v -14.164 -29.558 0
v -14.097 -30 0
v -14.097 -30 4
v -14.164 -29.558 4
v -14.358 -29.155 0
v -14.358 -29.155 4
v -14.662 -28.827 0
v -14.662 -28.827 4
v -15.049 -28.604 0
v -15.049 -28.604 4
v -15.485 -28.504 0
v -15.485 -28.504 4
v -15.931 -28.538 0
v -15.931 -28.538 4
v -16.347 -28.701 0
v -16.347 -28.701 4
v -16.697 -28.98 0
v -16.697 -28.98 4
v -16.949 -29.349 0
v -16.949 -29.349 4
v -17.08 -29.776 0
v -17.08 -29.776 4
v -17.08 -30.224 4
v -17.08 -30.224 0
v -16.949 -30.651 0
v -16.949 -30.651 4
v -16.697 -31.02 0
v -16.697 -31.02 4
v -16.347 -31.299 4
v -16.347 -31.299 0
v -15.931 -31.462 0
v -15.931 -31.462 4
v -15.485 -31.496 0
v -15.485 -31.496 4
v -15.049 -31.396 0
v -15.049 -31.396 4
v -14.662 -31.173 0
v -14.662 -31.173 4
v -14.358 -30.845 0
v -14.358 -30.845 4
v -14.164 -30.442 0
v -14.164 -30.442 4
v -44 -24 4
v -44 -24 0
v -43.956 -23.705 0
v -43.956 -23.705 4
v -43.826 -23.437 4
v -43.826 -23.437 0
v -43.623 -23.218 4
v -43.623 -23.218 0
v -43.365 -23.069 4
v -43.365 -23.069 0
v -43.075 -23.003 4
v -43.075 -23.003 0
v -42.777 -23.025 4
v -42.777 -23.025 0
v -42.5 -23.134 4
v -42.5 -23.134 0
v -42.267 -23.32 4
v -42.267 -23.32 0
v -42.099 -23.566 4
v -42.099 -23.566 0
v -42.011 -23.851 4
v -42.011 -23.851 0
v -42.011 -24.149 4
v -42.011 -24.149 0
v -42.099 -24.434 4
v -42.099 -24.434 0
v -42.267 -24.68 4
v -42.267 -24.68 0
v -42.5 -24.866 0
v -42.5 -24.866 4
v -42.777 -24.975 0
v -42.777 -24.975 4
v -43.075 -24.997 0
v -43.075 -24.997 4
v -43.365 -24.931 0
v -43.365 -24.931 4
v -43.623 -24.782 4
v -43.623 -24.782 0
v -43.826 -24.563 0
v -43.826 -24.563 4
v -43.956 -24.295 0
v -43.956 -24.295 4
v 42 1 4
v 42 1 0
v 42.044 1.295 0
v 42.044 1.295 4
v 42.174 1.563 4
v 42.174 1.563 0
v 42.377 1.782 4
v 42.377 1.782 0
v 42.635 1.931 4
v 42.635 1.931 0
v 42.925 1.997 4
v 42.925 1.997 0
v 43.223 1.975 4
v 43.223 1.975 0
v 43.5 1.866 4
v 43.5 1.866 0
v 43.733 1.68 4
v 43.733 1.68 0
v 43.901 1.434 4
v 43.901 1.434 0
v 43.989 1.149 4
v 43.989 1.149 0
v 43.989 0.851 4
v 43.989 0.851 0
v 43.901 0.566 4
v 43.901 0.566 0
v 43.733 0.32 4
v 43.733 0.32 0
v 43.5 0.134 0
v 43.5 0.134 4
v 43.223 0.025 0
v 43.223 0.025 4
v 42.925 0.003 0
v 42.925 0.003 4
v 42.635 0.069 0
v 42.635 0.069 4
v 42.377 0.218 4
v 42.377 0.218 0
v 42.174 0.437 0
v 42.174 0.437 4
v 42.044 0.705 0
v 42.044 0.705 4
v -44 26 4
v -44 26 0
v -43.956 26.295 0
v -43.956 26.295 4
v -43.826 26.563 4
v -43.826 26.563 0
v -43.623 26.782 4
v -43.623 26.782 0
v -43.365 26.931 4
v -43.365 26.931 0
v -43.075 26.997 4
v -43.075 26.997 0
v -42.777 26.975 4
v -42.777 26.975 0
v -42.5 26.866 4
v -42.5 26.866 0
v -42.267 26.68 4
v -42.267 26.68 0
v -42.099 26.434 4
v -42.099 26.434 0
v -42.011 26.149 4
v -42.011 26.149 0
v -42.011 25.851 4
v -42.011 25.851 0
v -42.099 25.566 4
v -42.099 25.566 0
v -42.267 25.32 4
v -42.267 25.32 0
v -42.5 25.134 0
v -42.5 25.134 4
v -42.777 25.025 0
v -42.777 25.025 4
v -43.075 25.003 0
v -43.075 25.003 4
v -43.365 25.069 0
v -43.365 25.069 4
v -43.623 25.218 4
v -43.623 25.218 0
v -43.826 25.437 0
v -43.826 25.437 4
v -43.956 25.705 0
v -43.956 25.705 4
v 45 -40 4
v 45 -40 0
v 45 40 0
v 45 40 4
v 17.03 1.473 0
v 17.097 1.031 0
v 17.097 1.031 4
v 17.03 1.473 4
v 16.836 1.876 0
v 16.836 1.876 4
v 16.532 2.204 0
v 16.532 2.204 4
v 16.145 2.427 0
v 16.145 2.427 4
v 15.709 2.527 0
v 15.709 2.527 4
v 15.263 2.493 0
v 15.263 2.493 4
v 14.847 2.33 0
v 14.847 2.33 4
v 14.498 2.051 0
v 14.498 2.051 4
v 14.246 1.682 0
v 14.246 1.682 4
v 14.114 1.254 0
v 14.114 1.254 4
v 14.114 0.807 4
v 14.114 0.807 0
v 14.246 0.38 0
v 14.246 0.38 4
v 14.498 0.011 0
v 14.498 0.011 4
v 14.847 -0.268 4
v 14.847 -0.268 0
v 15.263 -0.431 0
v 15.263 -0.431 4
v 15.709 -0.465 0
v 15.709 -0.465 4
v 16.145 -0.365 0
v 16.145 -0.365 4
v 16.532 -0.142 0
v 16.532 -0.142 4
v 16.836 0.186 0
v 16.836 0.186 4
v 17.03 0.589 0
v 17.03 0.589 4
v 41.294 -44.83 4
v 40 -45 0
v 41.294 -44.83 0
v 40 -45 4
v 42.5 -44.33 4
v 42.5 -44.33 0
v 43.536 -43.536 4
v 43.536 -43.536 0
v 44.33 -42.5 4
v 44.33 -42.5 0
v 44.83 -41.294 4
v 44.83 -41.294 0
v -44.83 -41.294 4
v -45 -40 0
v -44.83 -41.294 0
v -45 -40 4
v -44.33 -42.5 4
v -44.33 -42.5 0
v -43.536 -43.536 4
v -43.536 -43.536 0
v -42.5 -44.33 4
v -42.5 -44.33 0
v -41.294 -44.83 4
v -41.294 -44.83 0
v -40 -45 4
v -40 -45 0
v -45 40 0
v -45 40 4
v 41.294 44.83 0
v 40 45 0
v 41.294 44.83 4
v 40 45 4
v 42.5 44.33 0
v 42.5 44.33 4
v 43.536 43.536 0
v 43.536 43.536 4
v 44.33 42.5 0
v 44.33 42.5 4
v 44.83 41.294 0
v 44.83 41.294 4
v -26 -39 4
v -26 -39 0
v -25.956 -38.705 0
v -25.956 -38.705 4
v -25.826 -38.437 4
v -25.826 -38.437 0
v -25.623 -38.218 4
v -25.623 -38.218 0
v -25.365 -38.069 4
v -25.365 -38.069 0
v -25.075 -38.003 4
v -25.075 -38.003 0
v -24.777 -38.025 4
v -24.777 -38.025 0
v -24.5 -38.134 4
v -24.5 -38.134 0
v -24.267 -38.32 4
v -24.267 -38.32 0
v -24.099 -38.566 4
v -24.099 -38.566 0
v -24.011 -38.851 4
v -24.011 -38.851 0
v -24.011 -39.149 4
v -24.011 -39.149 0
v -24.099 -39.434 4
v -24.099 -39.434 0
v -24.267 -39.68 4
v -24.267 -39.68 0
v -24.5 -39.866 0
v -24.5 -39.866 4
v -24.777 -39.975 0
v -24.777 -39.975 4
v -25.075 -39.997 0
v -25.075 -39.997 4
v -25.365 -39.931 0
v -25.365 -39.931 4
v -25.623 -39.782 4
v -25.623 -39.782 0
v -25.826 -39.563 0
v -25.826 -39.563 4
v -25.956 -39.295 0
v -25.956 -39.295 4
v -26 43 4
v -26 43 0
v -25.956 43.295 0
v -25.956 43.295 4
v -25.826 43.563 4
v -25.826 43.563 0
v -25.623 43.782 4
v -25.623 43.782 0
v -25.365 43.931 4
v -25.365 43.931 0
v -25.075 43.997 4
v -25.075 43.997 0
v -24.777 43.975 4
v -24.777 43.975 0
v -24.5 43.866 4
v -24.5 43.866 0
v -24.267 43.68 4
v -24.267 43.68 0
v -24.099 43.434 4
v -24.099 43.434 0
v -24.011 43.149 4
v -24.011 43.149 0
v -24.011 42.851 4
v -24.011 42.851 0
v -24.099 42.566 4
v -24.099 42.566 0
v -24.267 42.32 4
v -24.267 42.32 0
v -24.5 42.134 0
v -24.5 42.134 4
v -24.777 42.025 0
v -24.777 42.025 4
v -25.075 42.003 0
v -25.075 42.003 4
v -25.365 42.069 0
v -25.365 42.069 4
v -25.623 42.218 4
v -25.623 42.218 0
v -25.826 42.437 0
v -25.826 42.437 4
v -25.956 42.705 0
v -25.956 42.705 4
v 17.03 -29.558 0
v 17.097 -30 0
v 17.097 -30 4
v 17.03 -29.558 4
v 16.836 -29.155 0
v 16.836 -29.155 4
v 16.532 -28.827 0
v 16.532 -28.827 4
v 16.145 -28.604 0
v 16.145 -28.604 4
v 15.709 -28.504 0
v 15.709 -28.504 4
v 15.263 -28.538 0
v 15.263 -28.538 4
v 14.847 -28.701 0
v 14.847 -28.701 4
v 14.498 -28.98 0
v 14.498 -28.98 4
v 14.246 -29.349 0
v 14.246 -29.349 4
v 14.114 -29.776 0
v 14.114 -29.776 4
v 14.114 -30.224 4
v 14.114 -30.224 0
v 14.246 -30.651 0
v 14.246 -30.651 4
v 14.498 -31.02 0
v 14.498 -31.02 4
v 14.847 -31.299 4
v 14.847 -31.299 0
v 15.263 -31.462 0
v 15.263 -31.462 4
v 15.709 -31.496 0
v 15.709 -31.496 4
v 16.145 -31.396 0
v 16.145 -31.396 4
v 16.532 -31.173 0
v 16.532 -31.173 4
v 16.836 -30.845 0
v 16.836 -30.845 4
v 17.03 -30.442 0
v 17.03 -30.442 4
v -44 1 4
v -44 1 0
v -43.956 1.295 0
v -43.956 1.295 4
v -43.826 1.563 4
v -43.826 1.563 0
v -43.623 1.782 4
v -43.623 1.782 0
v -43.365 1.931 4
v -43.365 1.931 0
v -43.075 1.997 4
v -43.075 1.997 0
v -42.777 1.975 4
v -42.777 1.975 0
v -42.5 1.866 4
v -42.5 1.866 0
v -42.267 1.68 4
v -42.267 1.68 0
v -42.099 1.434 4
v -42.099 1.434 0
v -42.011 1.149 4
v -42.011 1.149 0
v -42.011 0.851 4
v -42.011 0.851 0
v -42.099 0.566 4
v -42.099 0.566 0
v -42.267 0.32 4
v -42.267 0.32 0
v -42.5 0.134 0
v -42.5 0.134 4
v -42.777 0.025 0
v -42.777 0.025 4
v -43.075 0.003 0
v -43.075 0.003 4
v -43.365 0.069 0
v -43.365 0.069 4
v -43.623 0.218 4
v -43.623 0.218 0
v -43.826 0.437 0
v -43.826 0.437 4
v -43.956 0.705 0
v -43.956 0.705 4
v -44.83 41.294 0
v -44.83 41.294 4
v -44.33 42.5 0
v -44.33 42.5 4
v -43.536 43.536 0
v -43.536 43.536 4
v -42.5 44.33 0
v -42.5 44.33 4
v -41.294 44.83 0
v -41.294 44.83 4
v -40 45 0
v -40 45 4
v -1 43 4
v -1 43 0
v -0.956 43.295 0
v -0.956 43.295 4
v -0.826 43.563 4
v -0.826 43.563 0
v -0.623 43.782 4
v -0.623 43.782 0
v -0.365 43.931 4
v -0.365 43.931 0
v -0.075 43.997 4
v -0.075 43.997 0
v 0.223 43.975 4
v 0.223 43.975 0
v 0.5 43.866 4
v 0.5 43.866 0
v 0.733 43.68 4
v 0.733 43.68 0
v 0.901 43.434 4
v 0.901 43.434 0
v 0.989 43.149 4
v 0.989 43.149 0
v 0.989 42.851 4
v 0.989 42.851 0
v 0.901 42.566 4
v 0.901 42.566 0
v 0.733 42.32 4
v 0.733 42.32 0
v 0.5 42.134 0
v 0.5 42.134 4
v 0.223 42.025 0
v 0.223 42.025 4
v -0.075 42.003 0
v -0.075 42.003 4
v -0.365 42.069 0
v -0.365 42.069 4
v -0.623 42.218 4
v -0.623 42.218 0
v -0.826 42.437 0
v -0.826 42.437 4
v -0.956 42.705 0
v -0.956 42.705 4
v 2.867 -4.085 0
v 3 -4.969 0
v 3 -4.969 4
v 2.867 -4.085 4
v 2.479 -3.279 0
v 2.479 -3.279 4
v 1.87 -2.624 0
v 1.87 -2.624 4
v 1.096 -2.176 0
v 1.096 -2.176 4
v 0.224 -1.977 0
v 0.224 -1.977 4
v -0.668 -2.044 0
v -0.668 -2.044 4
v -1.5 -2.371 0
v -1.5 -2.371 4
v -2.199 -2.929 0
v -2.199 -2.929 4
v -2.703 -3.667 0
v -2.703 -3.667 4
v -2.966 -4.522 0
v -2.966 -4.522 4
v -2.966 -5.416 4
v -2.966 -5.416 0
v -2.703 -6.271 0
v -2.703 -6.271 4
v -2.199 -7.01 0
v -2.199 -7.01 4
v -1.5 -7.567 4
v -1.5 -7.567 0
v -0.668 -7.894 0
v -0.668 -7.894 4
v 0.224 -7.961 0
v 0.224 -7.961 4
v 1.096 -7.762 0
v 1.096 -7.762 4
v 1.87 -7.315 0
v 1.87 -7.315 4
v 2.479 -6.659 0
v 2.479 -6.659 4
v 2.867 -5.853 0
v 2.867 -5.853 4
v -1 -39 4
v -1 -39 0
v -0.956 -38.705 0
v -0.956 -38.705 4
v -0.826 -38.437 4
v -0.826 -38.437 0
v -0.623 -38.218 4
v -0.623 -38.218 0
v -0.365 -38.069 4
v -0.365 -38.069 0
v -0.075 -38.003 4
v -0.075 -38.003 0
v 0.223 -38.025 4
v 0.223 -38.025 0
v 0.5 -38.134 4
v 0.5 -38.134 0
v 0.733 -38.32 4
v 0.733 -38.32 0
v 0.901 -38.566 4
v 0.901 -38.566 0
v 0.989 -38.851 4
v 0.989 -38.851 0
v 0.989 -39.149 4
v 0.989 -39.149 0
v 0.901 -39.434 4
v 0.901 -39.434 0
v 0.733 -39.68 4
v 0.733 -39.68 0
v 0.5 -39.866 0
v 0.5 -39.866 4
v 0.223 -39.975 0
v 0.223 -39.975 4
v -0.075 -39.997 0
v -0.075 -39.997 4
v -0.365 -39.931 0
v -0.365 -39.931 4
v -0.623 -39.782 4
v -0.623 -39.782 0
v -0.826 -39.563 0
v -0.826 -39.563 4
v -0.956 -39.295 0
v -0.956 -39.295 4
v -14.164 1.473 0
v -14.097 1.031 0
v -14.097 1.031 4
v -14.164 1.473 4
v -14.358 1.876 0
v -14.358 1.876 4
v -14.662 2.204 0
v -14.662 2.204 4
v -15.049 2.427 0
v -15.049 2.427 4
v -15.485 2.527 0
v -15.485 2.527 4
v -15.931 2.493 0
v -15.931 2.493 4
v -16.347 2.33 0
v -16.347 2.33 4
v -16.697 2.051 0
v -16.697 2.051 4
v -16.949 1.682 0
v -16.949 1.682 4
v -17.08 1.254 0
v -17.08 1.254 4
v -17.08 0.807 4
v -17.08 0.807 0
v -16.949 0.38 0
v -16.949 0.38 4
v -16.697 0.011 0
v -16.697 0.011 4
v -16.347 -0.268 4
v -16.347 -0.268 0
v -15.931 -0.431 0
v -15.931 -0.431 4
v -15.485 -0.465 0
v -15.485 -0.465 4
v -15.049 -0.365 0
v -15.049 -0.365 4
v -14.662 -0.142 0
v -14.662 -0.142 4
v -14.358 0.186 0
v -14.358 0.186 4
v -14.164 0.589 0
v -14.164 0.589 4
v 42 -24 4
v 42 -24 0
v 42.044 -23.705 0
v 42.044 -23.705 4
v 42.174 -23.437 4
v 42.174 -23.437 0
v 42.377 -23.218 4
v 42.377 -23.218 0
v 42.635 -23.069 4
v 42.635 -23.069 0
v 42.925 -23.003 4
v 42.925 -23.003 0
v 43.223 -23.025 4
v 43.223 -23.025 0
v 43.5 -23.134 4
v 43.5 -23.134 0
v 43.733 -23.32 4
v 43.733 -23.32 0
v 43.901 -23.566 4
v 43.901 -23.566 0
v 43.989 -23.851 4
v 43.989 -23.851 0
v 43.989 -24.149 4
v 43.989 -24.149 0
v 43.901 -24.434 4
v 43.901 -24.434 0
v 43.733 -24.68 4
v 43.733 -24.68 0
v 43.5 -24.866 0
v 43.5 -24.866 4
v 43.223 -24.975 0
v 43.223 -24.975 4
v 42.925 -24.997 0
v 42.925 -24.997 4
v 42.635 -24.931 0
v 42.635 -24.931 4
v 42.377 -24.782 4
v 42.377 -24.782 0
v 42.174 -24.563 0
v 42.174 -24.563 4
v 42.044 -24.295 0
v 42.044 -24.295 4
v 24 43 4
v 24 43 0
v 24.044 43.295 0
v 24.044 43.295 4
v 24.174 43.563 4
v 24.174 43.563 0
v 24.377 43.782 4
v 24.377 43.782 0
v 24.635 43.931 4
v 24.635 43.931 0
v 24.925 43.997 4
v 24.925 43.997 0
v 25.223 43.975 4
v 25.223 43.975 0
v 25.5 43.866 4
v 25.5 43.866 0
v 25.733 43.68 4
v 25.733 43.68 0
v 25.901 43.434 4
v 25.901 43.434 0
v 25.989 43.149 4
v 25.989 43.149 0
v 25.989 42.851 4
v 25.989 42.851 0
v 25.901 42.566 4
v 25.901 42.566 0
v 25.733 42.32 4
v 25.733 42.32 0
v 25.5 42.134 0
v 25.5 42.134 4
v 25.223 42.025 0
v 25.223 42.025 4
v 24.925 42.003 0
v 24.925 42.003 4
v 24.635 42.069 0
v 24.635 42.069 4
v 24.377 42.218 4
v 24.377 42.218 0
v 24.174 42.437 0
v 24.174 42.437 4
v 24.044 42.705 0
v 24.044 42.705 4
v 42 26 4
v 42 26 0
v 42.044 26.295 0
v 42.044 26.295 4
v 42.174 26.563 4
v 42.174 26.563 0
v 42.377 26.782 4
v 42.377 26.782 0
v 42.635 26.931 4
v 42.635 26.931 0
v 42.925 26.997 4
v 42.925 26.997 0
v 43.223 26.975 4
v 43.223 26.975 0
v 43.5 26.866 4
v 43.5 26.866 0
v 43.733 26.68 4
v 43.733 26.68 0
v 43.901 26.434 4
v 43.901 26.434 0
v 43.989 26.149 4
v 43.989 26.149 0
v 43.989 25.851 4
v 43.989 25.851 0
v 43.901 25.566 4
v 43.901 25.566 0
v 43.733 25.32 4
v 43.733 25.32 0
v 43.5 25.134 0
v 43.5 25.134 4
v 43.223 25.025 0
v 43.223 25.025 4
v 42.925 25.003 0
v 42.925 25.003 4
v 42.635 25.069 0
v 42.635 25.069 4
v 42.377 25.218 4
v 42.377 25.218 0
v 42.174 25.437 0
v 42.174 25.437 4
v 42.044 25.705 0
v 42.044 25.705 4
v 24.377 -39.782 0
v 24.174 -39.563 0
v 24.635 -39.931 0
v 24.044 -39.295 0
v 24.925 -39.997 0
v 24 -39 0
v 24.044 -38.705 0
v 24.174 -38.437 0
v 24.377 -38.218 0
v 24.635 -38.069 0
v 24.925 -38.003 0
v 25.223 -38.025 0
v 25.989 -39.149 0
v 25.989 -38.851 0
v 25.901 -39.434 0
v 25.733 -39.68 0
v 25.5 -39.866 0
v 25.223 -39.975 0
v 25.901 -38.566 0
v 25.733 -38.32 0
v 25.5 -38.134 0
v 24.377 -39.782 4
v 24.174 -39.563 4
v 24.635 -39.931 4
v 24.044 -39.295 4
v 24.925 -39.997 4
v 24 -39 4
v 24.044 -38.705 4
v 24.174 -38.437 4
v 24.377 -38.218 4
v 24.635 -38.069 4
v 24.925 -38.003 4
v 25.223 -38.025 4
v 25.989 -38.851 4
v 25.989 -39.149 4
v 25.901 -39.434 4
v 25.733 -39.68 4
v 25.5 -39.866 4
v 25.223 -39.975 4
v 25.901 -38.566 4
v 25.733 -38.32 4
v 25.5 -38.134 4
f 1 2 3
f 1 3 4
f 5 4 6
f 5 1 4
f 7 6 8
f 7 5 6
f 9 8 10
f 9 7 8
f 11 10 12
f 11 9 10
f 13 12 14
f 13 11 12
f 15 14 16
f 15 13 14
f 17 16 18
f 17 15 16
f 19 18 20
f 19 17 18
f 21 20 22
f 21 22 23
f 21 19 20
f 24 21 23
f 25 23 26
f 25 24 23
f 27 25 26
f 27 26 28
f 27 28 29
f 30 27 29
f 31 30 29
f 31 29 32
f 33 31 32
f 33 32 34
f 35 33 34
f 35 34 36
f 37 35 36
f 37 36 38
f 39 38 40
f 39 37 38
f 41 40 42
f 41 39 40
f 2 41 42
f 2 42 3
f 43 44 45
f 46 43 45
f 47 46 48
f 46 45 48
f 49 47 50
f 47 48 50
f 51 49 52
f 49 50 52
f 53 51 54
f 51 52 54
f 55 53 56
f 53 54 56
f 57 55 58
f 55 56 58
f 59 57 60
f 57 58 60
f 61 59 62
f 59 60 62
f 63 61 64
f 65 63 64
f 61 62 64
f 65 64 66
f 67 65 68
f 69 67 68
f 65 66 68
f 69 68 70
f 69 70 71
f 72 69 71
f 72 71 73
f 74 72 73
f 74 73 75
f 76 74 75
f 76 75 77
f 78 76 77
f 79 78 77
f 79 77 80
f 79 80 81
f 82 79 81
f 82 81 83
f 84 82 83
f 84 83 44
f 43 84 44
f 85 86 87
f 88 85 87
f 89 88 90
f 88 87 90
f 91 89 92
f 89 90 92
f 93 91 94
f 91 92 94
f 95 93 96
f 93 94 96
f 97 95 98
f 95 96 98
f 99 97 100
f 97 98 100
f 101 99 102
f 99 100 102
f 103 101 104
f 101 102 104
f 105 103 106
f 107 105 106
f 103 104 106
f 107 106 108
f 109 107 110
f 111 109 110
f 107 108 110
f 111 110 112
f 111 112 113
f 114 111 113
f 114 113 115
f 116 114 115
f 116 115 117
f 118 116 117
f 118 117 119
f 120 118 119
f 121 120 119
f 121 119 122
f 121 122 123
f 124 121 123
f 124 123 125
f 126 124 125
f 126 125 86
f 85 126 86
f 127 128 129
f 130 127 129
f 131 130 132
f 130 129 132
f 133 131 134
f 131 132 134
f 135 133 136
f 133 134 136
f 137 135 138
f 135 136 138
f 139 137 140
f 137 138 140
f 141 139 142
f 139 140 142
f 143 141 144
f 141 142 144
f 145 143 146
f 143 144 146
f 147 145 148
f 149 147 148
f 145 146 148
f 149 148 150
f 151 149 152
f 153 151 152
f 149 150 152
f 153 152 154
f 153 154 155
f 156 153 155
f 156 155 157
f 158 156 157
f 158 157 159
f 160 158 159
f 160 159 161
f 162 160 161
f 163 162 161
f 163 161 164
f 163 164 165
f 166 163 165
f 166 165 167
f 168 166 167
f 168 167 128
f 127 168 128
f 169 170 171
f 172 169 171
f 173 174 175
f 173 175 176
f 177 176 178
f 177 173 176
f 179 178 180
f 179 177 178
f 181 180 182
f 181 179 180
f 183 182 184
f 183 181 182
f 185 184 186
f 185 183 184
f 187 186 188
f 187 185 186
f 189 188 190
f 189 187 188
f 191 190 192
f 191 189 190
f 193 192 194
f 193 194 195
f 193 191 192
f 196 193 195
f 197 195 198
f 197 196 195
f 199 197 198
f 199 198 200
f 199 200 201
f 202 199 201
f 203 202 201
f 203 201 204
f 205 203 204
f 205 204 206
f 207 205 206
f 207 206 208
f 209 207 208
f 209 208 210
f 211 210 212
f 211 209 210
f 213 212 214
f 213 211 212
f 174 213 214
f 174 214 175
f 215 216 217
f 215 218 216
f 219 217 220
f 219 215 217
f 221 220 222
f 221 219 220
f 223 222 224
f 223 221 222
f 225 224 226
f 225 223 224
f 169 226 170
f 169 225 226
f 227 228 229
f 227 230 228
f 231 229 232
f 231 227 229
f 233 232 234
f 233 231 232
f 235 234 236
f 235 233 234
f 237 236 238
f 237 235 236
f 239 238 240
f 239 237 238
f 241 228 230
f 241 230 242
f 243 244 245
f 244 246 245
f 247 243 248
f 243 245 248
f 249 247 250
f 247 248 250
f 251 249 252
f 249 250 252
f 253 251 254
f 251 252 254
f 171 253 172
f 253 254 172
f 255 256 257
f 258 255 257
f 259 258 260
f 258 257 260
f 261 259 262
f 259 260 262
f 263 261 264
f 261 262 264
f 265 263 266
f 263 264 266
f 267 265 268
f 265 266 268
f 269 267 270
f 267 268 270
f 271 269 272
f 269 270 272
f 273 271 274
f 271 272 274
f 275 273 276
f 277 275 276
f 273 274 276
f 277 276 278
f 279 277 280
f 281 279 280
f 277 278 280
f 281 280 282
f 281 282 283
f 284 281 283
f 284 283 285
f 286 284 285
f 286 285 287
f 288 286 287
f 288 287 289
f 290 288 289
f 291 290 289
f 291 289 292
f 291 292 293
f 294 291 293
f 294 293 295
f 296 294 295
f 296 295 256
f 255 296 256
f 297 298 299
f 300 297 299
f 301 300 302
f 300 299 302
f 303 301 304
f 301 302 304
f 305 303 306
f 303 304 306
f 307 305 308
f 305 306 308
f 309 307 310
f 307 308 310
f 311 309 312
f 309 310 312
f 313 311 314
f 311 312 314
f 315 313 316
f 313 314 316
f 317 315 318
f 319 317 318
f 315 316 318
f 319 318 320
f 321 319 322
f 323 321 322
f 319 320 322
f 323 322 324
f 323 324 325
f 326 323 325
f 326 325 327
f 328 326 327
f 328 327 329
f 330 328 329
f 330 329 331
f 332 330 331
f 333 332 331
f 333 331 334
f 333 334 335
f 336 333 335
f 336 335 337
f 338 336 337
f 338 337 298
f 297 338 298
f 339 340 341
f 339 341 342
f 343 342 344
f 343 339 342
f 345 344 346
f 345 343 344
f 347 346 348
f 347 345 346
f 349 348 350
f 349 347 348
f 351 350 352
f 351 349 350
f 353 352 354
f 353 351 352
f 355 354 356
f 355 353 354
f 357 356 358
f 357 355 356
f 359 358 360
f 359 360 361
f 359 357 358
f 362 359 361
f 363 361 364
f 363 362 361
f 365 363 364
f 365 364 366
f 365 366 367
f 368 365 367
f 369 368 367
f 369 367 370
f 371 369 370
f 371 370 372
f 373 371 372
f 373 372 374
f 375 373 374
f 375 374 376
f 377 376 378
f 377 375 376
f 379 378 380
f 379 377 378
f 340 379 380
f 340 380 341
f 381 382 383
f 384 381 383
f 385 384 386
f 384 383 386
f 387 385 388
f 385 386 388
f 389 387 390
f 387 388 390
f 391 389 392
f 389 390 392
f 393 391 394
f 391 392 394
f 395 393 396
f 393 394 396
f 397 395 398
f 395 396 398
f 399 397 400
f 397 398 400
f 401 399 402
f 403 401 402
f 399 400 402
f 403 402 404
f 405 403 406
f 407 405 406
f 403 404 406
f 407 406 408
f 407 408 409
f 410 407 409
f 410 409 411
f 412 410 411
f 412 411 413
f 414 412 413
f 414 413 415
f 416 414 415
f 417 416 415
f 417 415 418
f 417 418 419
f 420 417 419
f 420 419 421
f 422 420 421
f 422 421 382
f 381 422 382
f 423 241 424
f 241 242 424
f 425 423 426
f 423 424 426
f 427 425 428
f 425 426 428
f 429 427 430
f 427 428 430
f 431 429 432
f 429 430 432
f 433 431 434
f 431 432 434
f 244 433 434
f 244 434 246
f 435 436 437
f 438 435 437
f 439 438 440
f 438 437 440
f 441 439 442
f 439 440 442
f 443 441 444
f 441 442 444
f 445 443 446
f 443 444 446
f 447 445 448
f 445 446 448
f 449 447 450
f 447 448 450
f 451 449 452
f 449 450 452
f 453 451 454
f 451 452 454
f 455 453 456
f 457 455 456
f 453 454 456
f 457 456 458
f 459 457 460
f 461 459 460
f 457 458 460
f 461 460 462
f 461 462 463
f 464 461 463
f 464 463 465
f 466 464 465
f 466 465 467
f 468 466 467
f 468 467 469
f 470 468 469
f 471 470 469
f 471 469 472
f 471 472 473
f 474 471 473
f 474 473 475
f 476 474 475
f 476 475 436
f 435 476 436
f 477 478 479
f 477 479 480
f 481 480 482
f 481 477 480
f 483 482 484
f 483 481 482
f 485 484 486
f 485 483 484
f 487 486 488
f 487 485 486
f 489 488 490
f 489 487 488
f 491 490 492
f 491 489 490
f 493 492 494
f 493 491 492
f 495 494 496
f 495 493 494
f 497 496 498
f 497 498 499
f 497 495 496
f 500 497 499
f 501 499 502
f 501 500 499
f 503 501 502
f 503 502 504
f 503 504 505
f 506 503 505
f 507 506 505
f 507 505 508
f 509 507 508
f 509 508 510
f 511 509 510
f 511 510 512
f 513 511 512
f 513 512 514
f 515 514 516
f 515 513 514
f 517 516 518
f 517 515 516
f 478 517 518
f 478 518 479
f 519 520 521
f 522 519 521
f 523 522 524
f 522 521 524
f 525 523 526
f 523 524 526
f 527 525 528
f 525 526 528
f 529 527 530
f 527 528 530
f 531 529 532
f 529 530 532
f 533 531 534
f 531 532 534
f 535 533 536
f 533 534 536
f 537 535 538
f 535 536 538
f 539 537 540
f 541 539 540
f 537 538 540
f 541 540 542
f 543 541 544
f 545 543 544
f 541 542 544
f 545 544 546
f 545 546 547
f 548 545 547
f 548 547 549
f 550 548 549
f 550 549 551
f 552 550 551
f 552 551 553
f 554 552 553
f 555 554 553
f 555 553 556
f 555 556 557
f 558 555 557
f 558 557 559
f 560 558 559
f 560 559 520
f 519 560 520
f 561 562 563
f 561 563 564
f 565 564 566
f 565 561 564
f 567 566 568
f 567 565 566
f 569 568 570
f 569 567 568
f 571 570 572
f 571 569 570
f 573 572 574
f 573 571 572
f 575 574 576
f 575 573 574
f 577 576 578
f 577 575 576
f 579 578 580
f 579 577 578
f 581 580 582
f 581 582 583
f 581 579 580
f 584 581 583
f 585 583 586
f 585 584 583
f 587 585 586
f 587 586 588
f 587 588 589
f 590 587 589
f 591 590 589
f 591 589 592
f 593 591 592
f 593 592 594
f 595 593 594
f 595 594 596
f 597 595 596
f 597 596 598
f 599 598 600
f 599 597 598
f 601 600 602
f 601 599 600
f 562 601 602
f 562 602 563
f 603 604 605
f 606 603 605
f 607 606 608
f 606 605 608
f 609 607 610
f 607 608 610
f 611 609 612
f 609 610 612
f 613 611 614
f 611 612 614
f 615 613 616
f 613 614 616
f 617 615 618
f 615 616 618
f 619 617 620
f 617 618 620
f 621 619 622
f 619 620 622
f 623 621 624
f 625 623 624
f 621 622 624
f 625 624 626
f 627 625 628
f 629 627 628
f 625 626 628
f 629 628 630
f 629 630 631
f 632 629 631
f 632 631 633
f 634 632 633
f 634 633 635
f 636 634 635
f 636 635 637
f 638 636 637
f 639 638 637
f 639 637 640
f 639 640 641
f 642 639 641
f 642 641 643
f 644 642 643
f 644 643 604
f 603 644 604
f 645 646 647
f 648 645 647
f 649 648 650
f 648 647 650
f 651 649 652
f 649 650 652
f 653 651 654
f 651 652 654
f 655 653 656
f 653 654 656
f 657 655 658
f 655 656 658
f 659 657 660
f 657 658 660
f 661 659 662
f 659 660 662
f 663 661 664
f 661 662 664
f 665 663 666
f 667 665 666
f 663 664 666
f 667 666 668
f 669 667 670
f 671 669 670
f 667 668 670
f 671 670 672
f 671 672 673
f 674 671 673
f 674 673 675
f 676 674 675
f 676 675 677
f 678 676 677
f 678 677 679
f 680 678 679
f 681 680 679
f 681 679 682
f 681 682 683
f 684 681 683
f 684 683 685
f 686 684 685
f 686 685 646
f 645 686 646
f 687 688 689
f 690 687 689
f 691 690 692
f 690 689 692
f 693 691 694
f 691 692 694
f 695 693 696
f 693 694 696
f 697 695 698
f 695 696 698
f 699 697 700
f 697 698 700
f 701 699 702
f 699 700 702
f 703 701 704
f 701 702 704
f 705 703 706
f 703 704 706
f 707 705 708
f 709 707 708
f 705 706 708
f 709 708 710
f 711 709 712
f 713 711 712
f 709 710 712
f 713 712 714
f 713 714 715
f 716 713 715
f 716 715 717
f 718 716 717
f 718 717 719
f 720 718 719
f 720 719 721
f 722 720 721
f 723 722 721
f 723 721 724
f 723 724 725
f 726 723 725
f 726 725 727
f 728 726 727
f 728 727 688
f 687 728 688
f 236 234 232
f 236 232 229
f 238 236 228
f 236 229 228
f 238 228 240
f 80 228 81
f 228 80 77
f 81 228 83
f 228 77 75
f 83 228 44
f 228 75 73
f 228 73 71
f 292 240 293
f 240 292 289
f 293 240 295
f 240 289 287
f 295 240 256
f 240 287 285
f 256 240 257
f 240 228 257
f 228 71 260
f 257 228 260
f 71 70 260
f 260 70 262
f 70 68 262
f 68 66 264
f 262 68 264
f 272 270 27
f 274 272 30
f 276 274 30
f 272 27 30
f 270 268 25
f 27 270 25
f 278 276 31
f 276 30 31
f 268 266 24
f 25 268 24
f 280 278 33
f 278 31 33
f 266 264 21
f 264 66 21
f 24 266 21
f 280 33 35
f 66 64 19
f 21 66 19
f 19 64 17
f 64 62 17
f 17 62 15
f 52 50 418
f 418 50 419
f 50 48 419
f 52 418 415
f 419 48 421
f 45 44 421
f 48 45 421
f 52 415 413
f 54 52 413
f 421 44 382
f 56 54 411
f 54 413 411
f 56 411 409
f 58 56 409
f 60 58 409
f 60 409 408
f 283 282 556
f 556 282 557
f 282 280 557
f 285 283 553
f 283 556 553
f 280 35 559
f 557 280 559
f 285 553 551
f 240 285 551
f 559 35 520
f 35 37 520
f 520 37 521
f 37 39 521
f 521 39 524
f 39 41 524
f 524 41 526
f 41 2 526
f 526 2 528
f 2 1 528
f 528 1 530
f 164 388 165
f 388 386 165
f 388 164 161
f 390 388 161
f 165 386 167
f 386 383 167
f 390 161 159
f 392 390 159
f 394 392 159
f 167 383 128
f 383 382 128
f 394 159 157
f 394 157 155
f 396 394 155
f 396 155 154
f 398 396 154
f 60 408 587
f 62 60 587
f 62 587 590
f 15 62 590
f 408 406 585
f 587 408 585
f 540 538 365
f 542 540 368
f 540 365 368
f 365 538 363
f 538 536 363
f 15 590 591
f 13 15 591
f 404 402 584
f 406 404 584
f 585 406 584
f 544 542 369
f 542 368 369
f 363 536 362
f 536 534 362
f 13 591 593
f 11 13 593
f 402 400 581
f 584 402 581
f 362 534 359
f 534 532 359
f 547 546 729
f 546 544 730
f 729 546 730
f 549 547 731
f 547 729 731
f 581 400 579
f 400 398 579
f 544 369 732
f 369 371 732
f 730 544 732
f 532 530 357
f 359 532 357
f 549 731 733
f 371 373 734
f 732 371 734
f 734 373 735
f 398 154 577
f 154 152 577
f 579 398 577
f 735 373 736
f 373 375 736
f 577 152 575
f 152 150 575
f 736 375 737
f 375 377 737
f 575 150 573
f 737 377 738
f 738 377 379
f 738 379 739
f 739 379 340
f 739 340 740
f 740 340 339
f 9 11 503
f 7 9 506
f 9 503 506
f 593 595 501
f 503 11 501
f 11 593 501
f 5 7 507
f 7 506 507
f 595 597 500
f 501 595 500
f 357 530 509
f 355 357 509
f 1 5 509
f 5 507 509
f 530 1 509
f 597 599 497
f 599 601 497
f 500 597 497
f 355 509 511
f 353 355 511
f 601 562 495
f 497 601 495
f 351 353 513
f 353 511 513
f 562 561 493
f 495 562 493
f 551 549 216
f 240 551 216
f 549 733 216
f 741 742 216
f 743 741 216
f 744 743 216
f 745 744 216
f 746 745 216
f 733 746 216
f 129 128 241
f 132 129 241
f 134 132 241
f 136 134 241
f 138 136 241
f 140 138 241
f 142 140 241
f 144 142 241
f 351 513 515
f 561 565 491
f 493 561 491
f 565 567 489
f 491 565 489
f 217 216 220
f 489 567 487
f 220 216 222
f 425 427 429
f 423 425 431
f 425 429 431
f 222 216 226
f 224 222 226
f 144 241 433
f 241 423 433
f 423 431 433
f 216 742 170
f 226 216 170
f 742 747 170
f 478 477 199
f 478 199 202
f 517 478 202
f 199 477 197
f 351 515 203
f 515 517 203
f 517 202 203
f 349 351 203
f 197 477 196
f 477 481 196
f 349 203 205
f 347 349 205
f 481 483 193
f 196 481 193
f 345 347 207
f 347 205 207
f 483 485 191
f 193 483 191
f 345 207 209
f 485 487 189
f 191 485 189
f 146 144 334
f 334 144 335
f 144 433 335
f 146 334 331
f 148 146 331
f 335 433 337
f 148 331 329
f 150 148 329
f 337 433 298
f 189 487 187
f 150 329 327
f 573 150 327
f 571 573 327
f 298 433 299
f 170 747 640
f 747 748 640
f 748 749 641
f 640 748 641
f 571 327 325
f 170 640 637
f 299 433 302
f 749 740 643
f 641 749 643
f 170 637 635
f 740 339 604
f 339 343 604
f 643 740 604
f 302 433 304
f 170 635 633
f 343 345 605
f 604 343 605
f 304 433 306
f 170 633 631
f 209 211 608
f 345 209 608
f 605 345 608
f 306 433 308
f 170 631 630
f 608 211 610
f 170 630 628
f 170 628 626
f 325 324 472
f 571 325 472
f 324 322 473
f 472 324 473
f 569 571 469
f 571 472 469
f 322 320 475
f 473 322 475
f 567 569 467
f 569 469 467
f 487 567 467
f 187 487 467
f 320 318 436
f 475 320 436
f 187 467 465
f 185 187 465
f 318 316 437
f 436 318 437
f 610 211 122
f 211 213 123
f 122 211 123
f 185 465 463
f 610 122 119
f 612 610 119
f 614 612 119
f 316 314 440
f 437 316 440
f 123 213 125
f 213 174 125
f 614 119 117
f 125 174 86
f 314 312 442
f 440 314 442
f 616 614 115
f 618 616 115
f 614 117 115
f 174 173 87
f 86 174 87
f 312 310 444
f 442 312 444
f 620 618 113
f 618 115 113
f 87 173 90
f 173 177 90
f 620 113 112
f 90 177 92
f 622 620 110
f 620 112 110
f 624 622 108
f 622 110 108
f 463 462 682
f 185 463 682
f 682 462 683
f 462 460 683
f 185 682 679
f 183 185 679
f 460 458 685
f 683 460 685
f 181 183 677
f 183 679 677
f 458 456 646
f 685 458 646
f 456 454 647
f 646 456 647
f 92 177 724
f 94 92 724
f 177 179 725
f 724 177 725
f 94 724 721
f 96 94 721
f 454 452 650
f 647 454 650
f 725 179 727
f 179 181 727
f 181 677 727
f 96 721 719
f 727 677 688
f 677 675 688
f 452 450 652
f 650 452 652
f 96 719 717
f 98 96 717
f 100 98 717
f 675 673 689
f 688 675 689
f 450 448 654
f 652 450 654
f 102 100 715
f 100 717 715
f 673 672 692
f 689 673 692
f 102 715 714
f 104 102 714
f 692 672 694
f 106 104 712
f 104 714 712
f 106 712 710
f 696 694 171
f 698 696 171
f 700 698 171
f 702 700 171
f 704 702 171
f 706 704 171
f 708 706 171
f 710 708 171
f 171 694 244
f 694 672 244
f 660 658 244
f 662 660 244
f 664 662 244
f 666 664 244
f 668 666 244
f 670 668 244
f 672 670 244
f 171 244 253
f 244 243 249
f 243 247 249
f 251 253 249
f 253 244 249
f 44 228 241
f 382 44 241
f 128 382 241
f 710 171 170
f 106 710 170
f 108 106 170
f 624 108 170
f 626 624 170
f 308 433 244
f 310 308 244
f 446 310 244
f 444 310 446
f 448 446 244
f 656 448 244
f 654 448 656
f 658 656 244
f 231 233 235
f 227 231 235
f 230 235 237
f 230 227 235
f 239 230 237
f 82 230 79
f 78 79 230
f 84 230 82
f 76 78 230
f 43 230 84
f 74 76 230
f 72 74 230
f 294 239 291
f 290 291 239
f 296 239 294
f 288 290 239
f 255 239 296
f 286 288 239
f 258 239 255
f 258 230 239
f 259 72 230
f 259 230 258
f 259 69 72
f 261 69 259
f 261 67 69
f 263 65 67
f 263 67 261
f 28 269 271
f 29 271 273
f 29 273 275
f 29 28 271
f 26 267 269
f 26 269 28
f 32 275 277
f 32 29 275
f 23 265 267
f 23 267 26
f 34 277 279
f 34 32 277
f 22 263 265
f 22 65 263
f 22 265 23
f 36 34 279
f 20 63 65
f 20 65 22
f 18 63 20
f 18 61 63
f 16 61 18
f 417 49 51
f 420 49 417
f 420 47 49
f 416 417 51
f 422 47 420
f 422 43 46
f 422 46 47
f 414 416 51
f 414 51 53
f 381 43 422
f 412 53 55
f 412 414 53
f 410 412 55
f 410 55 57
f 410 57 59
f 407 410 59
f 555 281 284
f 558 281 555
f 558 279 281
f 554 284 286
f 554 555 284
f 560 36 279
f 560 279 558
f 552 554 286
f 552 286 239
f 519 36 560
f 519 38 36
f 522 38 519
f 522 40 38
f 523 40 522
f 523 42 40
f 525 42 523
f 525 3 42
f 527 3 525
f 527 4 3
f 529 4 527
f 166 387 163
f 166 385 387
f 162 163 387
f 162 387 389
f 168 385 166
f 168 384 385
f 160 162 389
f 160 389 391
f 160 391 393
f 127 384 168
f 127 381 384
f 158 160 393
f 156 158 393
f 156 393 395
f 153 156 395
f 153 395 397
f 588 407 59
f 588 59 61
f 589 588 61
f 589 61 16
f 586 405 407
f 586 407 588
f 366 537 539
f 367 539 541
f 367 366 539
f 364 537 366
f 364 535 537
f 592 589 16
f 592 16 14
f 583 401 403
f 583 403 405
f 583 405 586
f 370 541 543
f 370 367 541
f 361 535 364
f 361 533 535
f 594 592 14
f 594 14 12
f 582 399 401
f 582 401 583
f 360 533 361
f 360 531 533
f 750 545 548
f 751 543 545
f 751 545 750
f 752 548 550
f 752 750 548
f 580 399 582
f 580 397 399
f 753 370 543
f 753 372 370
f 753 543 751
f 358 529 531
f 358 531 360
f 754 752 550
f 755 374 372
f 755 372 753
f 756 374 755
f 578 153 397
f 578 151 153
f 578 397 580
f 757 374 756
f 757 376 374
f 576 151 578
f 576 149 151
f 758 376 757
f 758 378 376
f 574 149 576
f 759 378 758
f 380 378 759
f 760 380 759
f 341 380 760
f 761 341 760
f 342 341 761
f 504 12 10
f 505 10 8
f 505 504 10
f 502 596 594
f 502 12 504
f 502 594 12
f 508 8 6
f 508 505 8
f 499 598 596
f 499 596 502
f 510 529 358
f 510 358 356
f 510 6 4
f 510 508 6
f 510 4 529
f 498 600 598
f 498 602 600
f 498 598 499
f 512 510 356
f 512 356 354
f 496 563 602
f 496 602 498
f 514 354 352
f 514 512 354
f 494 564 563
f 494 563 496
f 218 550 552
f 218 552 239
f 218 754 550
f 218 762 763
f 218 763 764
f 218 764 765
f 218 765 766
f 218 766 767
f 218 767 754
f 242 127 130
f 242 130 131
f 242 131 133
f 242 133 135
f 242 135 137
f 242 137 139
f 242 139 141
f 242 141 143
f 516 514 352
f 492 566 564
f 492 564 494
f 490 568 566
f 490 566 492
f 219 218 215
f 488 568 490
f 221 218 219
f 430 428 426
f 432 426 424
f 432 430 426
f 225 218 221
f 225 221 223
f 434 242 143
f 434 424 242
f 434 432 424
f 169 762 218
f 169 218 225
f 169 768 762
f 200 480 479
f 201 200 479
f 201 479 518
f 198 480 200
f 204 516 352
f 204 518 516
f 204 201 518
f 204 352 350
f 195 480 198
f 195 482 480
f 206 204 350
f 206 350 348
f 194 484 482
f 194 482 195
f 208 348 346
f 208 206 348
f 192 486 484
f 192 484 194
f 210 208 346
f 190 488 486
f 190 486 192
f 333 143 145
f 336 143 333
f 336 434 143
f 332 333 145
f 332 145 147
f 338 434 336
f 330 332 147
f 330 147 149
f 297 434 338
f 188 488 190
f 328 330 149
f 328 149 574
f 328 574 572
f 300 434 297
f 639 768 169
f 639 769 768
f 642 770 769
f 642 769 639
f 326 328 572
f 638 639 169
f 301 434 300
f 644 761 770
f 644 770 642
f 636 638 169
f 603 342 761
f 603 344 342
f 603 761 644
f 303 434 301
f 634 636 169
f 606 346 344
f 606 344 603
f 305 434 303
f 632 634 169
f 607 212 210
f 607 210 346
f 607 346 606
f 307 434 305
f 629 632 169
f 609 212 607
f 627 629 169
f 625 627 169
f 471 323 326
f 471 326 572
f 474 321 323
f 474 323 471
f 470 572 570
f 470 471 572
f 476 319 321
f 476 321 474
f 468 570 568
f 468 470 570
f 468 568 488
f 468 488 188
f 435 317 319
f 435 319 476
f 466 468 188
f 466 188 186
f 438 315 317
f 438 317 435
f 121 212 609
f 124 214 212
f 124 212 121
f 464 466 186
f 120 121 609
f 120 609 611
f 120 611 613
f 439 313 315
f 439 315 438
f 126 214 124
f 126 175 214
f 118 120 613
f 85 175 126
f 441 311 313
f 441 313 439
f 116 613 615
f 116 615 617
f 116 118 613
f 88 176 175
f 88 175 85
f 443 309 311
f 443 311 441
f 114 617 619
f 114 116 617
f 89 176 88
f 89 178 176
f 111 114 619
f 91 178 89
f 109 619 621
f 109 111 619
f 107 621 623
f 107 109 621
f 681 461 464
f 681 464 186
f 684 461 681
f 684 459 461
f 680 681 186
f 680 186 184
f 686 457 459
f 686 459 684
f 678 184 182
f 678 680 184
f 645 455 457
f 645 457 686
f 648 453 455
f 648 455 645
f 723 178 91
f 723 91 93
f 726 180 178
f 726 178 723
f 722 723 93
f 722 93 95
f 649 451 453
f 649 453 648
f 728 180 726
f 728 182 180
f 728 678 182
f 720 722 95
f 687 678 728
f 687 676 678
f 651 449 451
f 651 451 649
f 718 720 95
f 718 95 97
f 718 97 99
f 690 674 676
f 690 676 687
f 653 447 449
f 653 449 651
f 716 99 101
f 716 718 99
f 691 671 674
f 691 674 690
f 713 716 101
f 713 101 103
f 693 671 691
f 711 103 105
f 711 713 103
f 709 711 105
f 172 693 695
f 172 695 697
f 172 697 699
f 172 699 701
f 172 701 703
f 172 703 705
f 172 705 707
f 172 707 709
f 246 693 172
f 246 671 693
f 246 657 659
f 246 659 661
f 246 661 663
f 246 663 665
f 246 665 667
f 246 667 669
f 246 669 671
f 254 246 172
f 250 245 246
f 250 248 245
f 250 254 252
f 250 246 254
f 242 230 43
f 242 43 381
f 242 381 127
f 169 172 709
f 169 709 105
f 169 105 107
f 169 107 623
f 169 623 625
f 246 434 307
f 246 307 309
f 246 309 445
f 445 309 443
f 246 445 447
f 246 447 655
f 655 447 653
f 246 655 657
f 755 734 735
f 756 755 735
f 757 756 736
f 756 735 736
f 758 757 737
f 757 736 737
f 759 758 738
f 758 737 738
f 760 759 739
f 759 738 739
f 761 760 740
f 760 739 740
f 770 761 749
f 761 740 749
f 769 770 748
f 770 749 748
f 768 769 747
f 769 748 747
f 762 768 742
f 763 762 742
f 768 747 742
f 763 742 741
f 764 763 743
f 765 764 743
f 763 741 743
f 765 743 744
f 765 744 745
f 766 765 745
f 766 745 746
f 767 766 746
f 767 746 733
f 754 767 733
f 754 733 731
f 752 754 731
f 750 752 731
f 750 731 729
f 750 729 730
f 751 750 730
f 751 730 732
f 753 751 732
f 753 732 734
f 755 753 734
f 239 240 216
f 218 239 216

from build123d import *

# Parameters (mm, degrees)
F0_W     = 90
F0_H     = 90
F0_R     = 1.5
F0_R_2   = 3
F1_DEPTH = 4
F2_R     = 5
F4_D     = 2
F4_DEPTH = 6


with BuildPart() as f1:
    # F0 (on Top) → F1 (new body)
    with BuildSketch(Plane.XY):
        Rectangle(F0_W, F0_H)
        with Locations((-15.597129, -30)):
            Circle(F0_R, mode=Mode.SUBTRACT)
        with Locations((15.597129, -30)):
            Circle(F0_R, mode=Mode.SUBTRACT)
        with Locations((0, -4.969076)):
            Circle(F0_R_2, mode=Mode.SUBTRACT)
        with Locations((-15.597129, 1.030924)):
            Circle(F0_R, mode=Mode.SUBTRACT)
        with Locations((15.597129, 1.030924)):
            Circle(F0_R, mode=Mode.SUBTRACT)
    extrude(amount=F1_DEPTH)

    # F2
    f2_edges = [f1.edges().sort_by_distance(p)[0] for p in [
        (-45, -45, 2),
        (45, -45, 2),
        (45, 45, 2),
        (-45, 45, 2),
    ]]
    fillet(f2_edges, radius=F2_R)

    # F4
    with Locations(Plane.XY.offset(4)):
        with Locations((-25, 43), (-43, 26), (-43, 1), (-43, -24), (-25, -39), (0, -39), (25, -39), (43, -24), (43, 1), (43, 26), (25, 43), (0, 43)):
            Hole(F4_D / 2, depth=F4_DEPTH)


solid = f1.part
